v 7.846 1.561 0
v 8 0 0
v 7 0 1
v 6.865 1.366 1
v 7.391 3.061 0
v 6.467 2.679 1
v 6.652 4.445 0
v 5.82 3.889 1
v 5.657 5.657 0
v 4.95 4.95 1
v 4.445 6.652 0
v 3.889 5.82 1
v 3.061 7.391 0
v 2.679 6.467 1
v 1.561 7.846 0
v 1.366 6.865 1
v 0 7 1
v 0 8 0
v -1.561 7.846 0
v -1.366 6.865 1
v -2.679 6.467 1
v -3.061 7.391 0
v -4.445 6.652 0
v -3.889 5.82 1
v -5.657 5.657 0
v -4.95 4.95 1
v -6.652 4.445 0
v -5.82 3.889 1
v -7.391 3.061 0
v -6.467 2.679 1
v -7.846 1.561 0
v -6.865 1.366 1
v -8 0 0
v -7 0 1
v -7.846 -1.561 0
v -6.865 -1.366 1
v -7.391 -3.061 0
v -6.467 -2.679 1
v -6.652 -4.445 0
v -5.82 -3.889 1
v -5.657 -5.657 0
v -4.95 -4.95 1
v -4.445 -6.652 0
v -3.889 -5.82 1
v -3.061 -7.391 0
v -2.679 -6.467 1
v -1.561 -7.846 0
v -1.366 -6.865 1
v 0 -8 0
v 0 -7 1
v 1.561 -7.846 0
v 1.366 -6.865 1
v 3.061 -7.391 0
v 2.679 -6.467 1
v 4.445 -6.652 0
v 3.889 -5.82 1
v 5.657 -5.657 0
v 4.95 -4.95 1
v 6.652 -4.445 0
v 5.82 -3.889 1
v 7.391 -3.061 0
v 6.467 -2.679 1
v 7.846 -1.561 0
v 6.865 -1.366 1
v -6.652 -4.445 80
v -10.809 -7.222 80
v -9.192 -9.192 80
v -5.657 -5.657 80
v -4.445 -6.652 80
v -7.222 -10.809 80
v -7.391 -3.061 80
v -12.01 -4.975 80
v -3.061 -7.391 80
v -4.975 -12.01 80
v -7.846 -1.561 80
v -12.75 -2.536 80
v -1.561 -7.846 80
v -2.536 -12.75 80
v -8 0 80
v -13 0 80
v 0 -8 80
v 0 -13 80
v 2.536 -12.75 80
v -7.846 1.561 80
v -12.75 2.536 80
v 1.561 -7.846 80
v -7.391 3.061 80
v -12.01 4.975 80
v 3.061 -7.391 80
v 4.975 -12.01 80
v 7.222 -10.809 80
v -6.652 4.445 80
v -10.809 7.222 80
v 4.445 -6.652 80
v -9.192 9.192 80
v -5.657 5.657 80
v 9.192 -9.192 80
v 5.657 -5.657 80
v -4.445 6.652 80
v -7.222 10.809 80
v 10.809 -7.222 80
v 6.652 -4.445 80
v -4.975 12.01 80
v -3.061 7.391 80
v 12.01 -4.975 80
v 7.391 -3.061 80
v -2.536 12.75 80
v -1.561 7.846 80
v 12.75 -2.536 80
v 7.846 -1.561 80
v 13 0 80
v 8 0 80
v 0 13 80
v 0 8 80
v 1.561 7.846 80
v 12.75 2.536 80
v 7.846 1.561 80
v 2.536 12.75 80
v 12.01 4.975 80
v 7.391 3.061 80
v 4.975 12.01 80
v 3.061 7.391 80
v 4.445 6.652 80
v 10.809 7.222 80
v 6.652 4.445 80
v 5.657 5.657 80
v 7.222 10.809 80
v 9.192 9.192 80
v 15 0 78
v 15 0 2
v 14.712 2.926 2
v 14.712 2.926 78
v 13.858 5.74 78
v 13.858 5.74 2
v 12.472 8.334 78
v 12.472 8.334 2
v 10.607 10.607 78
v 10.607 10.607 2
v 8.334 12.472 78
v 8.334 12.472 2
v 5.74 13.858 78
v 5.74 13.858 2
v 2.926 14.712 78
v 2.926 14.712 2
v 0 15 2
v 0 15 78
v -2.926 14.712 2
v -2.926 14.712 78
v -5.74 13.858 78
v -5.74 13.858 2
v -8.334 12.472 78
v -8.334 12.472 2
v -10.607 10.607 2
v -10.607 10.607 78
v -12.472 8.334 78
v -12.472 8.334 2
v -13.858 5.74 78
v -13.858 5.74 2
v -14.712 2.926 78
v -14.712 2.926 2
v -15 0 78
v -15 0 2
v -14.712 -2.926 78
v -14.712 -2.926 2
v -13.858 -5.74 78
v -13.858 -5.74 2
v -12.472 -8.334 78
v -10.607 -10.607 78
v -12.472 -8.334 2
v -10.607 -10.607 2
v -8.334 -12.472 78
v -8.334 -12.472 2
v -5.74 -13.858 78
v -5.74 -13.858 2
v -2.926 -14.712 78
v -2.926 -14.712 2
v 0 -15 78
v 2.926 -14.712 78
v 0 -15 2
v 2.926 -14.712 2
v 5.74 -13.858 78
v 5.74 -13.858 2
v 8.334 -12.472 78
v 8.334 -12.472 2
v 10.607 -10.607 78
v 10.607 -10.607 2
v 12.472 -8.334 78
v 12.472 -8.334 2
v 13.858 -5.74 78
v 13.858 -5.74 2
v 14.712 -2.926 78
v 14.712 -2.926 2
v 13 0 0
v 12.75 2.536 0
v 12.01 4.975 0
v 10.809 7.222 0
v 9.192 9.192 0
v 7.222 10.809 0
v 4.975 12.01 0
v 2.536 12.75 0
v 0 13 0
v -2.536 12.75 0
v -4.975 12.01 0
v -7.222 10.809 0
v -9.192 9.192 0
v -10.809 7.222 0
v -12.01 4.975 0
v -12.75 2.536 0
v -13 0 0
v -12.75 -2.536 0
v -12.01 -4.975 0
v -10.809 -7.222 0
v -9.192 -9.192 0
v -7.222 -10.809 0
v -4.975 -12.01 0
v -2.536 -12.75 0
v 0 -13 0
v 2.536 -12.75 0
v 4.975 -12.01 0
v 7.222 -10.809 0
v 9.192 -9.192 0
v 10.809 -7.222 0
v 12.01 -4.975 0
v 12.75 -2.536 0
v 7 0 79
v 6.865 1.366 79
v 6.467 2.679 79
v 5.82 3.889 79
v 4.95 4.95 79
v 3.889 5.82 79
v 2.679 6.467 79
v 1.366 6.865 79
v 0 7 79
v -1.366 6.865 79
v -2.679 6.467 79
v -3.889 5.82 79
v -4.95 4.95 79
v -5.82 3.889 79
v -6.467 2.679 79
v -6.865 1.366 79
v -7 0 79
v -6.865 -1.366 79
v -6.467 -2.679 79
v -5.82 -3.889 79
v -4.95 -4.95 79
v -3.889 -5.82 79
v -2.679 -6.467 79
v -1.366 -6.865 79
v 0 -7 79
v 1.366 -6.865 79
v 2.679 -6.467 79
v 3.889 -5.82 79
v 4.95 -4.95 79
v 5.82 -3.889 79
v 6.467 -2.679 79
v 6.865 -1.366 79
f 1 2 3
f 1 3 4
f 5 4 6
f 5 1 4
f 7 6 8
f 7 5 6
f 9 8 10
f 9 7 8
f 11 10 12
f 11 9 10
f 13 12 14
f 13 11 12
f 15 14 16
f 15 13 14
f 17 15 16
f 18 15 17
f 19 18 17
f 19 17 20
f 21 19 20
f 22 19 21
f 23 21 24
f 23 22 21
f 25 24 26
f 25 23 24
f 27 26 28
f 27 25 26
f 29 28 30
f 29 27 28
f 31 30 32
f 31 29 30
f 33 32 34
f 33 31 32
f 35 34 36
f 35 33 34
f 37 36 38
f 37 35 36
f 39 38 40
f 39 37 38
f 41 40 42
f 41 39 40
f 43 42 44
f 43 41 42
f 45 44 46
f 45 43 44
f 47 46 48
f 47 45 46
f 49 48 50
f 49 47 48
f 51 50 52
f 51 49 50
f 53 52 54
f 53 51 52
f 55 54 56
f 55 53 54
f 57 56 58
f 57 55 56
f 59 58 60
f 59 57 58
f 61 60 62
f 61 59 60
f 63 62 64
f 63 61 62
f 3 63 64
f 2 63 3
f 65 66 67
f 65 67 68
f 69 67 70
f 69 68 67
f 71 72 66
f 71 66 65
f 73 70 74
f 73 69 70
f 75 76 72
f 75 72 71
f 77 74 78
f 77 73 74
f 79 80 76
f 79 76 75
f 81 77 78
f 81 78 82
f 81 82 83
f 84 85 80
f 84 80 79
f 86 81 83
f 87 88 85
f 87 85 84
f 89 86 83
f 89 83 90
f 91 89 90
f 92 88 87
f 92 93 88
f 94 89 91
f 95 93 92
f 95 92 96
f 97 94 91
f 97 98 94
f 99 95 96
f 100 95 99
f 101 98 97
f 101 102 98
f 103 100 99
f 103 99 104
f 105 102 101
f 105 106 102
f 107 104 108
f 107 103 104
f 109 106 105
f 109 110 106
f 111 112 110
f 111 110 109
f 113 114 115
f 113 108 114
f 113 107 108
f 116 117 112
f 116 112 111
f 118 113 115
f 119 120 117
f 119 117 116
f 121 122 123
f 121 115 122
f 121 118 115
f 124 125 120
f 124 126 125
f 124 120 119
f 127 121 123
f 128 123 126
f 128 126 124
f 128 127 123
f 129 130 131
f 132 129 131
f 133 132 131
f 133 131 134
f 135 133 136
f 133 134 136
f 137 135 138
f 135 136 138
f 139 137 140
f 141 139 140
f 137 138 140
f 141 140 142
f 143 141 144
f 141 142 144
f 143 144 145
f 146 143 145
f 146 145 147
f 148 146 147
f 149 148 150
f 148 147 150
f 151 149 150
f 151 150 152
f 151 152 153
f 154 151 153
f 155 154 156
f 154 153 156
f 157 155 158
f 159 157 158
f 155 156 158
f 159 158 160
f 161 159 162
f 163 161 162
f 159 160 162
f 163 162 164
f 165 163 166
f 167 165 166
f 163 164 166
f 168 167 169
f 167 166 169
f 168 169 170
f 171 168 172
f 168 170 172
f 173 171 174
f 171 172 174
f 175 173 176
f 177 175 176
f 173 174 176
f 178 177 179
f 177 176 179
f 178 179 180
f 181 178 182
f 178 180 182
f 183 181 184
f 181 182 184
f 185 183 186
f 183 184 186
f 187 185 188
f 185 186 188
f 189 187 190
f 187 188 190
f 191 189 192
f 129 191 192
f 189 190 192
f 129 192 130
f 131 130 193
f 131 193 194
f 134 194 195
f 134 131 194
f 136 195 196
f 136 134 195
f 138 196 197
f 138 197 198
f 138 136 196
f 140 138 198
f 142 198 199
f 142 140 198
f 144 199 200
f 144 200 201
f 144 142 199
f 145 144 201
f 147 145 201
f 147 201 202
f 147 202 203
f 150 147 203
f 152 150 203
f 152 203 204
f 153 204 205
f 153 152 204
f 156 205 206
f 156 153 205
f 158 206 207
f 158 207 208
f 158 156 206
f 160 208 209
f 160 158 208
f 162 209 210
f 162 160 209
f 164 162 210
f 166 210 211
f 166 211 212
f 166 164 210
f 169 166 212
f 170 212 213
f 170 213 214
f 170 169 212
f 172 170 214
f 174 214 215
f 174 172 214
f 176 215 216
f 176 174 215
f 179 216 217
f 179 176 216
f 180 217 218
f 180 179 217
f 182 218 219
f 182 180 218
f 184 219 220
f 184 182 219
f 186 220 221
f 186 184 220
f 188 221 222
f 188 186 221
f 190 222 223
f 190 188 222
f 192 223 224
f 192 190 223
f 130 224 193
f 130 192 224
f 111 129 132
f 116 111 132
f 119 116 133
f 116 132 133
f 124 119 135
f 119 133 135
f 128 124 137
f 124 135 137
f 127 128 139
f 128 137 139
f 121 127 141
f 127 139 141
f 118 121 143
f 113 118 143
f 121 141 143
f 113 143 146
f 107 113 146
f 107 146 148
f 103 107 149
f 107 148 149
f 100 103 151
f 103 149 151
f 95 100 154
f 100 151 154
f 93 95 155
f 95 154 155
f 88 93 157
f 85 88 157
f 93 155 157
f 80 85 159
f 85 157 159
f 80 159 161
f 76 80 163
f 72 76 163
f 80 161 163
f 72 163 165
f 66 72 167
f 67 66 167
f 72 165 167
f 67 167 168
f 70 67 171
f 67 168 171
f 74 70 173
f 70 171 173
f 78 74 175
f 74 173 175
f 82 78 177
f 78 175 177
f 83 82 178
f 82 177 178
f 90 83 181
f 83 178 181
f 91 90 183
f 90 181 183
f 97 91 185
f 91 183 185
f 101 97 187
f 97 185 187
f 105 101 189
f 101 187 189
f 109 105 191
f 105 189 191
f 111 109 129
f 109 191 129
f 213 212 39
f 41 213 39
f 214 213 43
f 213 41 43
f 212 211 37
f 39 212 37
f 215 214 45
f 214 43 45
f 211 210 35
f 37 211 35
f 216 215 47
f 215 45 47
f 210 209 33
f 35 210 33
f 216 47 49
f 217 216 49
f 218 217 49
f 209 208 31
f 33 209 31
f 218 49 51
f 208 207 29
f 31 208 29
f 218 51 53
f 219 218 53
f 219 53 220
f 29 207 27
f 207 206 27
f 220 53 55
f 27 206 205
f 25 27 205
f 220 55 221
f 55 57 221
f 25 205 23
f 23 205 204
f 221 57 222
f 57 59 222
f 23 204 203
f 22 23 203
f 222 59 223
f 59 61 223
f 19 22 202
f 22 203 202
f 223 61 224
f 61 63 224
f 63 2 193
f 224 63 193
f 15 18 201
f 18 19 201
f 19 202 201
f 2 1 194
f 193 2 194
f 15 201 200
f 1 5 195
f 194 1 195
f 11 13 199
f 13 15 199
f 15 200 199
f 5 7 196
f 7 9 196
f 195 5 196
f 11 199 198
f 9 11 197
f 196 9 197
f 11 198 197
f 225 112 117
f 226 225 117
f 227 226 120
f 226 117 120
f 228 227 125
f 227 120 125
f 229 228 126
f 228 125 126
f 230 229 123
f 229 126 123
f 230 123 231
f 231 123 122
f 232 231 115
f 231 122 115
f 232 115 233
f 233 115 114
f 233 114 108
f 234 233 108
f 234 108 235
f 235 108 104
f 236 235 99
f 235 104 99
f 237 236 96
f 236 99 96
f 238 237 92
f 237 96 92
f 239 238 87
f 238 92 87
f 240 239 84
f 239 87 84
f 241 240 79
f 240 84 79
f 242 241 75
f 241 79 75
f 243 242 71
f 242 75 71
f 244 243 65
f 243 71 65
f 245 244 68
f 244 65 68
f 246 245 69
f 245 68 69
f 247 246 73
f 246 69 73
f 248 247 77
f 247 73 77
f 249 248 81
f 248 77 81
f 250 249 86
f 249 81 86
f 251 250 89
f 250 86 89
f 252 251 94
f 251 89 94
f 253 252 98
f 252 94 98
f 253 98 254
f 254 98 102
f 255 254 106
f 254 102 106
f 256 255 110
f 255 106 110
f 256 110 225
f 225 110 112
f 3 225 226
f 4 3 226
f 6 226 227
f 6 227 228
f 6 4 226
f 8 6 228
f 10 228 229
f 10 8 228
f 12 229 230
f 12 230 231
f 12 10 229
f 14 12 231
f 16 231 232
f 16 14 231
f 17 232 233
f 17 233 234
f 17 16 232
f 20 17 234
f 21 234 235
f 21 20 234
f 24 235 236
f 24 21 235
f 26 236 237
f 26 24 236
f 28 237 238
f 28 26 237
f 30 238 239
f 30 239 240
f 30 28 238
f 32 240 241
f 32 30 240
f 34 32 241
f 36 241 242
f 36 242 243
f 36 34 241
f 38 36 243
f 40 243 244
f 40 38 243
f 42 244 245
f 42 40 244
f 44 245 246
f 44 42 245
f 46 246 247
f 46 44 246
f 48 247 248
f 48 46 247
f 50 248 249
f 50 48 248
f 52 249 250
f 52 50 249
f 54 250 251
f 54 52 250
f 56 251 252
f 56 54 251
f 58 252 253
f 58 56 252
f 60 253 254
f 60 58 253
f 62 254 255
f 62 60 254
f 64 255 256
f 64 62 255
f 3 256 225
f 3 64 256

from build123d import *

# Parameters (mm, degrees)
SKETCH_1_R      = 15
SKETCH_1_R_2    = 7
EXTRUDE_1_DEPTH = 80
CHAMFER_1_SIZE  = 1
CHAMFER_2_SIZE  = 2


with BuildPart() as part:
    # Эскиз1 → Бобышка-Вытянуть1 (new body)
    with BuildSketch(Plane.XY):
        Circle(SKETCH_1_R)
        Circle(SKETCH_1_R_2, mode=Mode.SUBTRACT)
    extrude(amount=EXTRUDE_1_DEPTH)

    # Фаска1
    chamfer_1_edges = [part.edges().sort_by_distance(p)[0] for p in [
        (-7, 0, 0),
        (-7, 0, 80),
    ]]
    chamfer(chamfer_1_edges, length=CHAMFER_1_SIZE)

    # Фаска2
    chamfer_2_edges = [part.edges().sort_by_distance(p)[0] for p in [
        (-15, 0, 0),
        (-15, 0, 80),
    ]]
    chamfer(chamfer_2_edges, length=CHAMFER_2_SIZE)


solid = part.part
